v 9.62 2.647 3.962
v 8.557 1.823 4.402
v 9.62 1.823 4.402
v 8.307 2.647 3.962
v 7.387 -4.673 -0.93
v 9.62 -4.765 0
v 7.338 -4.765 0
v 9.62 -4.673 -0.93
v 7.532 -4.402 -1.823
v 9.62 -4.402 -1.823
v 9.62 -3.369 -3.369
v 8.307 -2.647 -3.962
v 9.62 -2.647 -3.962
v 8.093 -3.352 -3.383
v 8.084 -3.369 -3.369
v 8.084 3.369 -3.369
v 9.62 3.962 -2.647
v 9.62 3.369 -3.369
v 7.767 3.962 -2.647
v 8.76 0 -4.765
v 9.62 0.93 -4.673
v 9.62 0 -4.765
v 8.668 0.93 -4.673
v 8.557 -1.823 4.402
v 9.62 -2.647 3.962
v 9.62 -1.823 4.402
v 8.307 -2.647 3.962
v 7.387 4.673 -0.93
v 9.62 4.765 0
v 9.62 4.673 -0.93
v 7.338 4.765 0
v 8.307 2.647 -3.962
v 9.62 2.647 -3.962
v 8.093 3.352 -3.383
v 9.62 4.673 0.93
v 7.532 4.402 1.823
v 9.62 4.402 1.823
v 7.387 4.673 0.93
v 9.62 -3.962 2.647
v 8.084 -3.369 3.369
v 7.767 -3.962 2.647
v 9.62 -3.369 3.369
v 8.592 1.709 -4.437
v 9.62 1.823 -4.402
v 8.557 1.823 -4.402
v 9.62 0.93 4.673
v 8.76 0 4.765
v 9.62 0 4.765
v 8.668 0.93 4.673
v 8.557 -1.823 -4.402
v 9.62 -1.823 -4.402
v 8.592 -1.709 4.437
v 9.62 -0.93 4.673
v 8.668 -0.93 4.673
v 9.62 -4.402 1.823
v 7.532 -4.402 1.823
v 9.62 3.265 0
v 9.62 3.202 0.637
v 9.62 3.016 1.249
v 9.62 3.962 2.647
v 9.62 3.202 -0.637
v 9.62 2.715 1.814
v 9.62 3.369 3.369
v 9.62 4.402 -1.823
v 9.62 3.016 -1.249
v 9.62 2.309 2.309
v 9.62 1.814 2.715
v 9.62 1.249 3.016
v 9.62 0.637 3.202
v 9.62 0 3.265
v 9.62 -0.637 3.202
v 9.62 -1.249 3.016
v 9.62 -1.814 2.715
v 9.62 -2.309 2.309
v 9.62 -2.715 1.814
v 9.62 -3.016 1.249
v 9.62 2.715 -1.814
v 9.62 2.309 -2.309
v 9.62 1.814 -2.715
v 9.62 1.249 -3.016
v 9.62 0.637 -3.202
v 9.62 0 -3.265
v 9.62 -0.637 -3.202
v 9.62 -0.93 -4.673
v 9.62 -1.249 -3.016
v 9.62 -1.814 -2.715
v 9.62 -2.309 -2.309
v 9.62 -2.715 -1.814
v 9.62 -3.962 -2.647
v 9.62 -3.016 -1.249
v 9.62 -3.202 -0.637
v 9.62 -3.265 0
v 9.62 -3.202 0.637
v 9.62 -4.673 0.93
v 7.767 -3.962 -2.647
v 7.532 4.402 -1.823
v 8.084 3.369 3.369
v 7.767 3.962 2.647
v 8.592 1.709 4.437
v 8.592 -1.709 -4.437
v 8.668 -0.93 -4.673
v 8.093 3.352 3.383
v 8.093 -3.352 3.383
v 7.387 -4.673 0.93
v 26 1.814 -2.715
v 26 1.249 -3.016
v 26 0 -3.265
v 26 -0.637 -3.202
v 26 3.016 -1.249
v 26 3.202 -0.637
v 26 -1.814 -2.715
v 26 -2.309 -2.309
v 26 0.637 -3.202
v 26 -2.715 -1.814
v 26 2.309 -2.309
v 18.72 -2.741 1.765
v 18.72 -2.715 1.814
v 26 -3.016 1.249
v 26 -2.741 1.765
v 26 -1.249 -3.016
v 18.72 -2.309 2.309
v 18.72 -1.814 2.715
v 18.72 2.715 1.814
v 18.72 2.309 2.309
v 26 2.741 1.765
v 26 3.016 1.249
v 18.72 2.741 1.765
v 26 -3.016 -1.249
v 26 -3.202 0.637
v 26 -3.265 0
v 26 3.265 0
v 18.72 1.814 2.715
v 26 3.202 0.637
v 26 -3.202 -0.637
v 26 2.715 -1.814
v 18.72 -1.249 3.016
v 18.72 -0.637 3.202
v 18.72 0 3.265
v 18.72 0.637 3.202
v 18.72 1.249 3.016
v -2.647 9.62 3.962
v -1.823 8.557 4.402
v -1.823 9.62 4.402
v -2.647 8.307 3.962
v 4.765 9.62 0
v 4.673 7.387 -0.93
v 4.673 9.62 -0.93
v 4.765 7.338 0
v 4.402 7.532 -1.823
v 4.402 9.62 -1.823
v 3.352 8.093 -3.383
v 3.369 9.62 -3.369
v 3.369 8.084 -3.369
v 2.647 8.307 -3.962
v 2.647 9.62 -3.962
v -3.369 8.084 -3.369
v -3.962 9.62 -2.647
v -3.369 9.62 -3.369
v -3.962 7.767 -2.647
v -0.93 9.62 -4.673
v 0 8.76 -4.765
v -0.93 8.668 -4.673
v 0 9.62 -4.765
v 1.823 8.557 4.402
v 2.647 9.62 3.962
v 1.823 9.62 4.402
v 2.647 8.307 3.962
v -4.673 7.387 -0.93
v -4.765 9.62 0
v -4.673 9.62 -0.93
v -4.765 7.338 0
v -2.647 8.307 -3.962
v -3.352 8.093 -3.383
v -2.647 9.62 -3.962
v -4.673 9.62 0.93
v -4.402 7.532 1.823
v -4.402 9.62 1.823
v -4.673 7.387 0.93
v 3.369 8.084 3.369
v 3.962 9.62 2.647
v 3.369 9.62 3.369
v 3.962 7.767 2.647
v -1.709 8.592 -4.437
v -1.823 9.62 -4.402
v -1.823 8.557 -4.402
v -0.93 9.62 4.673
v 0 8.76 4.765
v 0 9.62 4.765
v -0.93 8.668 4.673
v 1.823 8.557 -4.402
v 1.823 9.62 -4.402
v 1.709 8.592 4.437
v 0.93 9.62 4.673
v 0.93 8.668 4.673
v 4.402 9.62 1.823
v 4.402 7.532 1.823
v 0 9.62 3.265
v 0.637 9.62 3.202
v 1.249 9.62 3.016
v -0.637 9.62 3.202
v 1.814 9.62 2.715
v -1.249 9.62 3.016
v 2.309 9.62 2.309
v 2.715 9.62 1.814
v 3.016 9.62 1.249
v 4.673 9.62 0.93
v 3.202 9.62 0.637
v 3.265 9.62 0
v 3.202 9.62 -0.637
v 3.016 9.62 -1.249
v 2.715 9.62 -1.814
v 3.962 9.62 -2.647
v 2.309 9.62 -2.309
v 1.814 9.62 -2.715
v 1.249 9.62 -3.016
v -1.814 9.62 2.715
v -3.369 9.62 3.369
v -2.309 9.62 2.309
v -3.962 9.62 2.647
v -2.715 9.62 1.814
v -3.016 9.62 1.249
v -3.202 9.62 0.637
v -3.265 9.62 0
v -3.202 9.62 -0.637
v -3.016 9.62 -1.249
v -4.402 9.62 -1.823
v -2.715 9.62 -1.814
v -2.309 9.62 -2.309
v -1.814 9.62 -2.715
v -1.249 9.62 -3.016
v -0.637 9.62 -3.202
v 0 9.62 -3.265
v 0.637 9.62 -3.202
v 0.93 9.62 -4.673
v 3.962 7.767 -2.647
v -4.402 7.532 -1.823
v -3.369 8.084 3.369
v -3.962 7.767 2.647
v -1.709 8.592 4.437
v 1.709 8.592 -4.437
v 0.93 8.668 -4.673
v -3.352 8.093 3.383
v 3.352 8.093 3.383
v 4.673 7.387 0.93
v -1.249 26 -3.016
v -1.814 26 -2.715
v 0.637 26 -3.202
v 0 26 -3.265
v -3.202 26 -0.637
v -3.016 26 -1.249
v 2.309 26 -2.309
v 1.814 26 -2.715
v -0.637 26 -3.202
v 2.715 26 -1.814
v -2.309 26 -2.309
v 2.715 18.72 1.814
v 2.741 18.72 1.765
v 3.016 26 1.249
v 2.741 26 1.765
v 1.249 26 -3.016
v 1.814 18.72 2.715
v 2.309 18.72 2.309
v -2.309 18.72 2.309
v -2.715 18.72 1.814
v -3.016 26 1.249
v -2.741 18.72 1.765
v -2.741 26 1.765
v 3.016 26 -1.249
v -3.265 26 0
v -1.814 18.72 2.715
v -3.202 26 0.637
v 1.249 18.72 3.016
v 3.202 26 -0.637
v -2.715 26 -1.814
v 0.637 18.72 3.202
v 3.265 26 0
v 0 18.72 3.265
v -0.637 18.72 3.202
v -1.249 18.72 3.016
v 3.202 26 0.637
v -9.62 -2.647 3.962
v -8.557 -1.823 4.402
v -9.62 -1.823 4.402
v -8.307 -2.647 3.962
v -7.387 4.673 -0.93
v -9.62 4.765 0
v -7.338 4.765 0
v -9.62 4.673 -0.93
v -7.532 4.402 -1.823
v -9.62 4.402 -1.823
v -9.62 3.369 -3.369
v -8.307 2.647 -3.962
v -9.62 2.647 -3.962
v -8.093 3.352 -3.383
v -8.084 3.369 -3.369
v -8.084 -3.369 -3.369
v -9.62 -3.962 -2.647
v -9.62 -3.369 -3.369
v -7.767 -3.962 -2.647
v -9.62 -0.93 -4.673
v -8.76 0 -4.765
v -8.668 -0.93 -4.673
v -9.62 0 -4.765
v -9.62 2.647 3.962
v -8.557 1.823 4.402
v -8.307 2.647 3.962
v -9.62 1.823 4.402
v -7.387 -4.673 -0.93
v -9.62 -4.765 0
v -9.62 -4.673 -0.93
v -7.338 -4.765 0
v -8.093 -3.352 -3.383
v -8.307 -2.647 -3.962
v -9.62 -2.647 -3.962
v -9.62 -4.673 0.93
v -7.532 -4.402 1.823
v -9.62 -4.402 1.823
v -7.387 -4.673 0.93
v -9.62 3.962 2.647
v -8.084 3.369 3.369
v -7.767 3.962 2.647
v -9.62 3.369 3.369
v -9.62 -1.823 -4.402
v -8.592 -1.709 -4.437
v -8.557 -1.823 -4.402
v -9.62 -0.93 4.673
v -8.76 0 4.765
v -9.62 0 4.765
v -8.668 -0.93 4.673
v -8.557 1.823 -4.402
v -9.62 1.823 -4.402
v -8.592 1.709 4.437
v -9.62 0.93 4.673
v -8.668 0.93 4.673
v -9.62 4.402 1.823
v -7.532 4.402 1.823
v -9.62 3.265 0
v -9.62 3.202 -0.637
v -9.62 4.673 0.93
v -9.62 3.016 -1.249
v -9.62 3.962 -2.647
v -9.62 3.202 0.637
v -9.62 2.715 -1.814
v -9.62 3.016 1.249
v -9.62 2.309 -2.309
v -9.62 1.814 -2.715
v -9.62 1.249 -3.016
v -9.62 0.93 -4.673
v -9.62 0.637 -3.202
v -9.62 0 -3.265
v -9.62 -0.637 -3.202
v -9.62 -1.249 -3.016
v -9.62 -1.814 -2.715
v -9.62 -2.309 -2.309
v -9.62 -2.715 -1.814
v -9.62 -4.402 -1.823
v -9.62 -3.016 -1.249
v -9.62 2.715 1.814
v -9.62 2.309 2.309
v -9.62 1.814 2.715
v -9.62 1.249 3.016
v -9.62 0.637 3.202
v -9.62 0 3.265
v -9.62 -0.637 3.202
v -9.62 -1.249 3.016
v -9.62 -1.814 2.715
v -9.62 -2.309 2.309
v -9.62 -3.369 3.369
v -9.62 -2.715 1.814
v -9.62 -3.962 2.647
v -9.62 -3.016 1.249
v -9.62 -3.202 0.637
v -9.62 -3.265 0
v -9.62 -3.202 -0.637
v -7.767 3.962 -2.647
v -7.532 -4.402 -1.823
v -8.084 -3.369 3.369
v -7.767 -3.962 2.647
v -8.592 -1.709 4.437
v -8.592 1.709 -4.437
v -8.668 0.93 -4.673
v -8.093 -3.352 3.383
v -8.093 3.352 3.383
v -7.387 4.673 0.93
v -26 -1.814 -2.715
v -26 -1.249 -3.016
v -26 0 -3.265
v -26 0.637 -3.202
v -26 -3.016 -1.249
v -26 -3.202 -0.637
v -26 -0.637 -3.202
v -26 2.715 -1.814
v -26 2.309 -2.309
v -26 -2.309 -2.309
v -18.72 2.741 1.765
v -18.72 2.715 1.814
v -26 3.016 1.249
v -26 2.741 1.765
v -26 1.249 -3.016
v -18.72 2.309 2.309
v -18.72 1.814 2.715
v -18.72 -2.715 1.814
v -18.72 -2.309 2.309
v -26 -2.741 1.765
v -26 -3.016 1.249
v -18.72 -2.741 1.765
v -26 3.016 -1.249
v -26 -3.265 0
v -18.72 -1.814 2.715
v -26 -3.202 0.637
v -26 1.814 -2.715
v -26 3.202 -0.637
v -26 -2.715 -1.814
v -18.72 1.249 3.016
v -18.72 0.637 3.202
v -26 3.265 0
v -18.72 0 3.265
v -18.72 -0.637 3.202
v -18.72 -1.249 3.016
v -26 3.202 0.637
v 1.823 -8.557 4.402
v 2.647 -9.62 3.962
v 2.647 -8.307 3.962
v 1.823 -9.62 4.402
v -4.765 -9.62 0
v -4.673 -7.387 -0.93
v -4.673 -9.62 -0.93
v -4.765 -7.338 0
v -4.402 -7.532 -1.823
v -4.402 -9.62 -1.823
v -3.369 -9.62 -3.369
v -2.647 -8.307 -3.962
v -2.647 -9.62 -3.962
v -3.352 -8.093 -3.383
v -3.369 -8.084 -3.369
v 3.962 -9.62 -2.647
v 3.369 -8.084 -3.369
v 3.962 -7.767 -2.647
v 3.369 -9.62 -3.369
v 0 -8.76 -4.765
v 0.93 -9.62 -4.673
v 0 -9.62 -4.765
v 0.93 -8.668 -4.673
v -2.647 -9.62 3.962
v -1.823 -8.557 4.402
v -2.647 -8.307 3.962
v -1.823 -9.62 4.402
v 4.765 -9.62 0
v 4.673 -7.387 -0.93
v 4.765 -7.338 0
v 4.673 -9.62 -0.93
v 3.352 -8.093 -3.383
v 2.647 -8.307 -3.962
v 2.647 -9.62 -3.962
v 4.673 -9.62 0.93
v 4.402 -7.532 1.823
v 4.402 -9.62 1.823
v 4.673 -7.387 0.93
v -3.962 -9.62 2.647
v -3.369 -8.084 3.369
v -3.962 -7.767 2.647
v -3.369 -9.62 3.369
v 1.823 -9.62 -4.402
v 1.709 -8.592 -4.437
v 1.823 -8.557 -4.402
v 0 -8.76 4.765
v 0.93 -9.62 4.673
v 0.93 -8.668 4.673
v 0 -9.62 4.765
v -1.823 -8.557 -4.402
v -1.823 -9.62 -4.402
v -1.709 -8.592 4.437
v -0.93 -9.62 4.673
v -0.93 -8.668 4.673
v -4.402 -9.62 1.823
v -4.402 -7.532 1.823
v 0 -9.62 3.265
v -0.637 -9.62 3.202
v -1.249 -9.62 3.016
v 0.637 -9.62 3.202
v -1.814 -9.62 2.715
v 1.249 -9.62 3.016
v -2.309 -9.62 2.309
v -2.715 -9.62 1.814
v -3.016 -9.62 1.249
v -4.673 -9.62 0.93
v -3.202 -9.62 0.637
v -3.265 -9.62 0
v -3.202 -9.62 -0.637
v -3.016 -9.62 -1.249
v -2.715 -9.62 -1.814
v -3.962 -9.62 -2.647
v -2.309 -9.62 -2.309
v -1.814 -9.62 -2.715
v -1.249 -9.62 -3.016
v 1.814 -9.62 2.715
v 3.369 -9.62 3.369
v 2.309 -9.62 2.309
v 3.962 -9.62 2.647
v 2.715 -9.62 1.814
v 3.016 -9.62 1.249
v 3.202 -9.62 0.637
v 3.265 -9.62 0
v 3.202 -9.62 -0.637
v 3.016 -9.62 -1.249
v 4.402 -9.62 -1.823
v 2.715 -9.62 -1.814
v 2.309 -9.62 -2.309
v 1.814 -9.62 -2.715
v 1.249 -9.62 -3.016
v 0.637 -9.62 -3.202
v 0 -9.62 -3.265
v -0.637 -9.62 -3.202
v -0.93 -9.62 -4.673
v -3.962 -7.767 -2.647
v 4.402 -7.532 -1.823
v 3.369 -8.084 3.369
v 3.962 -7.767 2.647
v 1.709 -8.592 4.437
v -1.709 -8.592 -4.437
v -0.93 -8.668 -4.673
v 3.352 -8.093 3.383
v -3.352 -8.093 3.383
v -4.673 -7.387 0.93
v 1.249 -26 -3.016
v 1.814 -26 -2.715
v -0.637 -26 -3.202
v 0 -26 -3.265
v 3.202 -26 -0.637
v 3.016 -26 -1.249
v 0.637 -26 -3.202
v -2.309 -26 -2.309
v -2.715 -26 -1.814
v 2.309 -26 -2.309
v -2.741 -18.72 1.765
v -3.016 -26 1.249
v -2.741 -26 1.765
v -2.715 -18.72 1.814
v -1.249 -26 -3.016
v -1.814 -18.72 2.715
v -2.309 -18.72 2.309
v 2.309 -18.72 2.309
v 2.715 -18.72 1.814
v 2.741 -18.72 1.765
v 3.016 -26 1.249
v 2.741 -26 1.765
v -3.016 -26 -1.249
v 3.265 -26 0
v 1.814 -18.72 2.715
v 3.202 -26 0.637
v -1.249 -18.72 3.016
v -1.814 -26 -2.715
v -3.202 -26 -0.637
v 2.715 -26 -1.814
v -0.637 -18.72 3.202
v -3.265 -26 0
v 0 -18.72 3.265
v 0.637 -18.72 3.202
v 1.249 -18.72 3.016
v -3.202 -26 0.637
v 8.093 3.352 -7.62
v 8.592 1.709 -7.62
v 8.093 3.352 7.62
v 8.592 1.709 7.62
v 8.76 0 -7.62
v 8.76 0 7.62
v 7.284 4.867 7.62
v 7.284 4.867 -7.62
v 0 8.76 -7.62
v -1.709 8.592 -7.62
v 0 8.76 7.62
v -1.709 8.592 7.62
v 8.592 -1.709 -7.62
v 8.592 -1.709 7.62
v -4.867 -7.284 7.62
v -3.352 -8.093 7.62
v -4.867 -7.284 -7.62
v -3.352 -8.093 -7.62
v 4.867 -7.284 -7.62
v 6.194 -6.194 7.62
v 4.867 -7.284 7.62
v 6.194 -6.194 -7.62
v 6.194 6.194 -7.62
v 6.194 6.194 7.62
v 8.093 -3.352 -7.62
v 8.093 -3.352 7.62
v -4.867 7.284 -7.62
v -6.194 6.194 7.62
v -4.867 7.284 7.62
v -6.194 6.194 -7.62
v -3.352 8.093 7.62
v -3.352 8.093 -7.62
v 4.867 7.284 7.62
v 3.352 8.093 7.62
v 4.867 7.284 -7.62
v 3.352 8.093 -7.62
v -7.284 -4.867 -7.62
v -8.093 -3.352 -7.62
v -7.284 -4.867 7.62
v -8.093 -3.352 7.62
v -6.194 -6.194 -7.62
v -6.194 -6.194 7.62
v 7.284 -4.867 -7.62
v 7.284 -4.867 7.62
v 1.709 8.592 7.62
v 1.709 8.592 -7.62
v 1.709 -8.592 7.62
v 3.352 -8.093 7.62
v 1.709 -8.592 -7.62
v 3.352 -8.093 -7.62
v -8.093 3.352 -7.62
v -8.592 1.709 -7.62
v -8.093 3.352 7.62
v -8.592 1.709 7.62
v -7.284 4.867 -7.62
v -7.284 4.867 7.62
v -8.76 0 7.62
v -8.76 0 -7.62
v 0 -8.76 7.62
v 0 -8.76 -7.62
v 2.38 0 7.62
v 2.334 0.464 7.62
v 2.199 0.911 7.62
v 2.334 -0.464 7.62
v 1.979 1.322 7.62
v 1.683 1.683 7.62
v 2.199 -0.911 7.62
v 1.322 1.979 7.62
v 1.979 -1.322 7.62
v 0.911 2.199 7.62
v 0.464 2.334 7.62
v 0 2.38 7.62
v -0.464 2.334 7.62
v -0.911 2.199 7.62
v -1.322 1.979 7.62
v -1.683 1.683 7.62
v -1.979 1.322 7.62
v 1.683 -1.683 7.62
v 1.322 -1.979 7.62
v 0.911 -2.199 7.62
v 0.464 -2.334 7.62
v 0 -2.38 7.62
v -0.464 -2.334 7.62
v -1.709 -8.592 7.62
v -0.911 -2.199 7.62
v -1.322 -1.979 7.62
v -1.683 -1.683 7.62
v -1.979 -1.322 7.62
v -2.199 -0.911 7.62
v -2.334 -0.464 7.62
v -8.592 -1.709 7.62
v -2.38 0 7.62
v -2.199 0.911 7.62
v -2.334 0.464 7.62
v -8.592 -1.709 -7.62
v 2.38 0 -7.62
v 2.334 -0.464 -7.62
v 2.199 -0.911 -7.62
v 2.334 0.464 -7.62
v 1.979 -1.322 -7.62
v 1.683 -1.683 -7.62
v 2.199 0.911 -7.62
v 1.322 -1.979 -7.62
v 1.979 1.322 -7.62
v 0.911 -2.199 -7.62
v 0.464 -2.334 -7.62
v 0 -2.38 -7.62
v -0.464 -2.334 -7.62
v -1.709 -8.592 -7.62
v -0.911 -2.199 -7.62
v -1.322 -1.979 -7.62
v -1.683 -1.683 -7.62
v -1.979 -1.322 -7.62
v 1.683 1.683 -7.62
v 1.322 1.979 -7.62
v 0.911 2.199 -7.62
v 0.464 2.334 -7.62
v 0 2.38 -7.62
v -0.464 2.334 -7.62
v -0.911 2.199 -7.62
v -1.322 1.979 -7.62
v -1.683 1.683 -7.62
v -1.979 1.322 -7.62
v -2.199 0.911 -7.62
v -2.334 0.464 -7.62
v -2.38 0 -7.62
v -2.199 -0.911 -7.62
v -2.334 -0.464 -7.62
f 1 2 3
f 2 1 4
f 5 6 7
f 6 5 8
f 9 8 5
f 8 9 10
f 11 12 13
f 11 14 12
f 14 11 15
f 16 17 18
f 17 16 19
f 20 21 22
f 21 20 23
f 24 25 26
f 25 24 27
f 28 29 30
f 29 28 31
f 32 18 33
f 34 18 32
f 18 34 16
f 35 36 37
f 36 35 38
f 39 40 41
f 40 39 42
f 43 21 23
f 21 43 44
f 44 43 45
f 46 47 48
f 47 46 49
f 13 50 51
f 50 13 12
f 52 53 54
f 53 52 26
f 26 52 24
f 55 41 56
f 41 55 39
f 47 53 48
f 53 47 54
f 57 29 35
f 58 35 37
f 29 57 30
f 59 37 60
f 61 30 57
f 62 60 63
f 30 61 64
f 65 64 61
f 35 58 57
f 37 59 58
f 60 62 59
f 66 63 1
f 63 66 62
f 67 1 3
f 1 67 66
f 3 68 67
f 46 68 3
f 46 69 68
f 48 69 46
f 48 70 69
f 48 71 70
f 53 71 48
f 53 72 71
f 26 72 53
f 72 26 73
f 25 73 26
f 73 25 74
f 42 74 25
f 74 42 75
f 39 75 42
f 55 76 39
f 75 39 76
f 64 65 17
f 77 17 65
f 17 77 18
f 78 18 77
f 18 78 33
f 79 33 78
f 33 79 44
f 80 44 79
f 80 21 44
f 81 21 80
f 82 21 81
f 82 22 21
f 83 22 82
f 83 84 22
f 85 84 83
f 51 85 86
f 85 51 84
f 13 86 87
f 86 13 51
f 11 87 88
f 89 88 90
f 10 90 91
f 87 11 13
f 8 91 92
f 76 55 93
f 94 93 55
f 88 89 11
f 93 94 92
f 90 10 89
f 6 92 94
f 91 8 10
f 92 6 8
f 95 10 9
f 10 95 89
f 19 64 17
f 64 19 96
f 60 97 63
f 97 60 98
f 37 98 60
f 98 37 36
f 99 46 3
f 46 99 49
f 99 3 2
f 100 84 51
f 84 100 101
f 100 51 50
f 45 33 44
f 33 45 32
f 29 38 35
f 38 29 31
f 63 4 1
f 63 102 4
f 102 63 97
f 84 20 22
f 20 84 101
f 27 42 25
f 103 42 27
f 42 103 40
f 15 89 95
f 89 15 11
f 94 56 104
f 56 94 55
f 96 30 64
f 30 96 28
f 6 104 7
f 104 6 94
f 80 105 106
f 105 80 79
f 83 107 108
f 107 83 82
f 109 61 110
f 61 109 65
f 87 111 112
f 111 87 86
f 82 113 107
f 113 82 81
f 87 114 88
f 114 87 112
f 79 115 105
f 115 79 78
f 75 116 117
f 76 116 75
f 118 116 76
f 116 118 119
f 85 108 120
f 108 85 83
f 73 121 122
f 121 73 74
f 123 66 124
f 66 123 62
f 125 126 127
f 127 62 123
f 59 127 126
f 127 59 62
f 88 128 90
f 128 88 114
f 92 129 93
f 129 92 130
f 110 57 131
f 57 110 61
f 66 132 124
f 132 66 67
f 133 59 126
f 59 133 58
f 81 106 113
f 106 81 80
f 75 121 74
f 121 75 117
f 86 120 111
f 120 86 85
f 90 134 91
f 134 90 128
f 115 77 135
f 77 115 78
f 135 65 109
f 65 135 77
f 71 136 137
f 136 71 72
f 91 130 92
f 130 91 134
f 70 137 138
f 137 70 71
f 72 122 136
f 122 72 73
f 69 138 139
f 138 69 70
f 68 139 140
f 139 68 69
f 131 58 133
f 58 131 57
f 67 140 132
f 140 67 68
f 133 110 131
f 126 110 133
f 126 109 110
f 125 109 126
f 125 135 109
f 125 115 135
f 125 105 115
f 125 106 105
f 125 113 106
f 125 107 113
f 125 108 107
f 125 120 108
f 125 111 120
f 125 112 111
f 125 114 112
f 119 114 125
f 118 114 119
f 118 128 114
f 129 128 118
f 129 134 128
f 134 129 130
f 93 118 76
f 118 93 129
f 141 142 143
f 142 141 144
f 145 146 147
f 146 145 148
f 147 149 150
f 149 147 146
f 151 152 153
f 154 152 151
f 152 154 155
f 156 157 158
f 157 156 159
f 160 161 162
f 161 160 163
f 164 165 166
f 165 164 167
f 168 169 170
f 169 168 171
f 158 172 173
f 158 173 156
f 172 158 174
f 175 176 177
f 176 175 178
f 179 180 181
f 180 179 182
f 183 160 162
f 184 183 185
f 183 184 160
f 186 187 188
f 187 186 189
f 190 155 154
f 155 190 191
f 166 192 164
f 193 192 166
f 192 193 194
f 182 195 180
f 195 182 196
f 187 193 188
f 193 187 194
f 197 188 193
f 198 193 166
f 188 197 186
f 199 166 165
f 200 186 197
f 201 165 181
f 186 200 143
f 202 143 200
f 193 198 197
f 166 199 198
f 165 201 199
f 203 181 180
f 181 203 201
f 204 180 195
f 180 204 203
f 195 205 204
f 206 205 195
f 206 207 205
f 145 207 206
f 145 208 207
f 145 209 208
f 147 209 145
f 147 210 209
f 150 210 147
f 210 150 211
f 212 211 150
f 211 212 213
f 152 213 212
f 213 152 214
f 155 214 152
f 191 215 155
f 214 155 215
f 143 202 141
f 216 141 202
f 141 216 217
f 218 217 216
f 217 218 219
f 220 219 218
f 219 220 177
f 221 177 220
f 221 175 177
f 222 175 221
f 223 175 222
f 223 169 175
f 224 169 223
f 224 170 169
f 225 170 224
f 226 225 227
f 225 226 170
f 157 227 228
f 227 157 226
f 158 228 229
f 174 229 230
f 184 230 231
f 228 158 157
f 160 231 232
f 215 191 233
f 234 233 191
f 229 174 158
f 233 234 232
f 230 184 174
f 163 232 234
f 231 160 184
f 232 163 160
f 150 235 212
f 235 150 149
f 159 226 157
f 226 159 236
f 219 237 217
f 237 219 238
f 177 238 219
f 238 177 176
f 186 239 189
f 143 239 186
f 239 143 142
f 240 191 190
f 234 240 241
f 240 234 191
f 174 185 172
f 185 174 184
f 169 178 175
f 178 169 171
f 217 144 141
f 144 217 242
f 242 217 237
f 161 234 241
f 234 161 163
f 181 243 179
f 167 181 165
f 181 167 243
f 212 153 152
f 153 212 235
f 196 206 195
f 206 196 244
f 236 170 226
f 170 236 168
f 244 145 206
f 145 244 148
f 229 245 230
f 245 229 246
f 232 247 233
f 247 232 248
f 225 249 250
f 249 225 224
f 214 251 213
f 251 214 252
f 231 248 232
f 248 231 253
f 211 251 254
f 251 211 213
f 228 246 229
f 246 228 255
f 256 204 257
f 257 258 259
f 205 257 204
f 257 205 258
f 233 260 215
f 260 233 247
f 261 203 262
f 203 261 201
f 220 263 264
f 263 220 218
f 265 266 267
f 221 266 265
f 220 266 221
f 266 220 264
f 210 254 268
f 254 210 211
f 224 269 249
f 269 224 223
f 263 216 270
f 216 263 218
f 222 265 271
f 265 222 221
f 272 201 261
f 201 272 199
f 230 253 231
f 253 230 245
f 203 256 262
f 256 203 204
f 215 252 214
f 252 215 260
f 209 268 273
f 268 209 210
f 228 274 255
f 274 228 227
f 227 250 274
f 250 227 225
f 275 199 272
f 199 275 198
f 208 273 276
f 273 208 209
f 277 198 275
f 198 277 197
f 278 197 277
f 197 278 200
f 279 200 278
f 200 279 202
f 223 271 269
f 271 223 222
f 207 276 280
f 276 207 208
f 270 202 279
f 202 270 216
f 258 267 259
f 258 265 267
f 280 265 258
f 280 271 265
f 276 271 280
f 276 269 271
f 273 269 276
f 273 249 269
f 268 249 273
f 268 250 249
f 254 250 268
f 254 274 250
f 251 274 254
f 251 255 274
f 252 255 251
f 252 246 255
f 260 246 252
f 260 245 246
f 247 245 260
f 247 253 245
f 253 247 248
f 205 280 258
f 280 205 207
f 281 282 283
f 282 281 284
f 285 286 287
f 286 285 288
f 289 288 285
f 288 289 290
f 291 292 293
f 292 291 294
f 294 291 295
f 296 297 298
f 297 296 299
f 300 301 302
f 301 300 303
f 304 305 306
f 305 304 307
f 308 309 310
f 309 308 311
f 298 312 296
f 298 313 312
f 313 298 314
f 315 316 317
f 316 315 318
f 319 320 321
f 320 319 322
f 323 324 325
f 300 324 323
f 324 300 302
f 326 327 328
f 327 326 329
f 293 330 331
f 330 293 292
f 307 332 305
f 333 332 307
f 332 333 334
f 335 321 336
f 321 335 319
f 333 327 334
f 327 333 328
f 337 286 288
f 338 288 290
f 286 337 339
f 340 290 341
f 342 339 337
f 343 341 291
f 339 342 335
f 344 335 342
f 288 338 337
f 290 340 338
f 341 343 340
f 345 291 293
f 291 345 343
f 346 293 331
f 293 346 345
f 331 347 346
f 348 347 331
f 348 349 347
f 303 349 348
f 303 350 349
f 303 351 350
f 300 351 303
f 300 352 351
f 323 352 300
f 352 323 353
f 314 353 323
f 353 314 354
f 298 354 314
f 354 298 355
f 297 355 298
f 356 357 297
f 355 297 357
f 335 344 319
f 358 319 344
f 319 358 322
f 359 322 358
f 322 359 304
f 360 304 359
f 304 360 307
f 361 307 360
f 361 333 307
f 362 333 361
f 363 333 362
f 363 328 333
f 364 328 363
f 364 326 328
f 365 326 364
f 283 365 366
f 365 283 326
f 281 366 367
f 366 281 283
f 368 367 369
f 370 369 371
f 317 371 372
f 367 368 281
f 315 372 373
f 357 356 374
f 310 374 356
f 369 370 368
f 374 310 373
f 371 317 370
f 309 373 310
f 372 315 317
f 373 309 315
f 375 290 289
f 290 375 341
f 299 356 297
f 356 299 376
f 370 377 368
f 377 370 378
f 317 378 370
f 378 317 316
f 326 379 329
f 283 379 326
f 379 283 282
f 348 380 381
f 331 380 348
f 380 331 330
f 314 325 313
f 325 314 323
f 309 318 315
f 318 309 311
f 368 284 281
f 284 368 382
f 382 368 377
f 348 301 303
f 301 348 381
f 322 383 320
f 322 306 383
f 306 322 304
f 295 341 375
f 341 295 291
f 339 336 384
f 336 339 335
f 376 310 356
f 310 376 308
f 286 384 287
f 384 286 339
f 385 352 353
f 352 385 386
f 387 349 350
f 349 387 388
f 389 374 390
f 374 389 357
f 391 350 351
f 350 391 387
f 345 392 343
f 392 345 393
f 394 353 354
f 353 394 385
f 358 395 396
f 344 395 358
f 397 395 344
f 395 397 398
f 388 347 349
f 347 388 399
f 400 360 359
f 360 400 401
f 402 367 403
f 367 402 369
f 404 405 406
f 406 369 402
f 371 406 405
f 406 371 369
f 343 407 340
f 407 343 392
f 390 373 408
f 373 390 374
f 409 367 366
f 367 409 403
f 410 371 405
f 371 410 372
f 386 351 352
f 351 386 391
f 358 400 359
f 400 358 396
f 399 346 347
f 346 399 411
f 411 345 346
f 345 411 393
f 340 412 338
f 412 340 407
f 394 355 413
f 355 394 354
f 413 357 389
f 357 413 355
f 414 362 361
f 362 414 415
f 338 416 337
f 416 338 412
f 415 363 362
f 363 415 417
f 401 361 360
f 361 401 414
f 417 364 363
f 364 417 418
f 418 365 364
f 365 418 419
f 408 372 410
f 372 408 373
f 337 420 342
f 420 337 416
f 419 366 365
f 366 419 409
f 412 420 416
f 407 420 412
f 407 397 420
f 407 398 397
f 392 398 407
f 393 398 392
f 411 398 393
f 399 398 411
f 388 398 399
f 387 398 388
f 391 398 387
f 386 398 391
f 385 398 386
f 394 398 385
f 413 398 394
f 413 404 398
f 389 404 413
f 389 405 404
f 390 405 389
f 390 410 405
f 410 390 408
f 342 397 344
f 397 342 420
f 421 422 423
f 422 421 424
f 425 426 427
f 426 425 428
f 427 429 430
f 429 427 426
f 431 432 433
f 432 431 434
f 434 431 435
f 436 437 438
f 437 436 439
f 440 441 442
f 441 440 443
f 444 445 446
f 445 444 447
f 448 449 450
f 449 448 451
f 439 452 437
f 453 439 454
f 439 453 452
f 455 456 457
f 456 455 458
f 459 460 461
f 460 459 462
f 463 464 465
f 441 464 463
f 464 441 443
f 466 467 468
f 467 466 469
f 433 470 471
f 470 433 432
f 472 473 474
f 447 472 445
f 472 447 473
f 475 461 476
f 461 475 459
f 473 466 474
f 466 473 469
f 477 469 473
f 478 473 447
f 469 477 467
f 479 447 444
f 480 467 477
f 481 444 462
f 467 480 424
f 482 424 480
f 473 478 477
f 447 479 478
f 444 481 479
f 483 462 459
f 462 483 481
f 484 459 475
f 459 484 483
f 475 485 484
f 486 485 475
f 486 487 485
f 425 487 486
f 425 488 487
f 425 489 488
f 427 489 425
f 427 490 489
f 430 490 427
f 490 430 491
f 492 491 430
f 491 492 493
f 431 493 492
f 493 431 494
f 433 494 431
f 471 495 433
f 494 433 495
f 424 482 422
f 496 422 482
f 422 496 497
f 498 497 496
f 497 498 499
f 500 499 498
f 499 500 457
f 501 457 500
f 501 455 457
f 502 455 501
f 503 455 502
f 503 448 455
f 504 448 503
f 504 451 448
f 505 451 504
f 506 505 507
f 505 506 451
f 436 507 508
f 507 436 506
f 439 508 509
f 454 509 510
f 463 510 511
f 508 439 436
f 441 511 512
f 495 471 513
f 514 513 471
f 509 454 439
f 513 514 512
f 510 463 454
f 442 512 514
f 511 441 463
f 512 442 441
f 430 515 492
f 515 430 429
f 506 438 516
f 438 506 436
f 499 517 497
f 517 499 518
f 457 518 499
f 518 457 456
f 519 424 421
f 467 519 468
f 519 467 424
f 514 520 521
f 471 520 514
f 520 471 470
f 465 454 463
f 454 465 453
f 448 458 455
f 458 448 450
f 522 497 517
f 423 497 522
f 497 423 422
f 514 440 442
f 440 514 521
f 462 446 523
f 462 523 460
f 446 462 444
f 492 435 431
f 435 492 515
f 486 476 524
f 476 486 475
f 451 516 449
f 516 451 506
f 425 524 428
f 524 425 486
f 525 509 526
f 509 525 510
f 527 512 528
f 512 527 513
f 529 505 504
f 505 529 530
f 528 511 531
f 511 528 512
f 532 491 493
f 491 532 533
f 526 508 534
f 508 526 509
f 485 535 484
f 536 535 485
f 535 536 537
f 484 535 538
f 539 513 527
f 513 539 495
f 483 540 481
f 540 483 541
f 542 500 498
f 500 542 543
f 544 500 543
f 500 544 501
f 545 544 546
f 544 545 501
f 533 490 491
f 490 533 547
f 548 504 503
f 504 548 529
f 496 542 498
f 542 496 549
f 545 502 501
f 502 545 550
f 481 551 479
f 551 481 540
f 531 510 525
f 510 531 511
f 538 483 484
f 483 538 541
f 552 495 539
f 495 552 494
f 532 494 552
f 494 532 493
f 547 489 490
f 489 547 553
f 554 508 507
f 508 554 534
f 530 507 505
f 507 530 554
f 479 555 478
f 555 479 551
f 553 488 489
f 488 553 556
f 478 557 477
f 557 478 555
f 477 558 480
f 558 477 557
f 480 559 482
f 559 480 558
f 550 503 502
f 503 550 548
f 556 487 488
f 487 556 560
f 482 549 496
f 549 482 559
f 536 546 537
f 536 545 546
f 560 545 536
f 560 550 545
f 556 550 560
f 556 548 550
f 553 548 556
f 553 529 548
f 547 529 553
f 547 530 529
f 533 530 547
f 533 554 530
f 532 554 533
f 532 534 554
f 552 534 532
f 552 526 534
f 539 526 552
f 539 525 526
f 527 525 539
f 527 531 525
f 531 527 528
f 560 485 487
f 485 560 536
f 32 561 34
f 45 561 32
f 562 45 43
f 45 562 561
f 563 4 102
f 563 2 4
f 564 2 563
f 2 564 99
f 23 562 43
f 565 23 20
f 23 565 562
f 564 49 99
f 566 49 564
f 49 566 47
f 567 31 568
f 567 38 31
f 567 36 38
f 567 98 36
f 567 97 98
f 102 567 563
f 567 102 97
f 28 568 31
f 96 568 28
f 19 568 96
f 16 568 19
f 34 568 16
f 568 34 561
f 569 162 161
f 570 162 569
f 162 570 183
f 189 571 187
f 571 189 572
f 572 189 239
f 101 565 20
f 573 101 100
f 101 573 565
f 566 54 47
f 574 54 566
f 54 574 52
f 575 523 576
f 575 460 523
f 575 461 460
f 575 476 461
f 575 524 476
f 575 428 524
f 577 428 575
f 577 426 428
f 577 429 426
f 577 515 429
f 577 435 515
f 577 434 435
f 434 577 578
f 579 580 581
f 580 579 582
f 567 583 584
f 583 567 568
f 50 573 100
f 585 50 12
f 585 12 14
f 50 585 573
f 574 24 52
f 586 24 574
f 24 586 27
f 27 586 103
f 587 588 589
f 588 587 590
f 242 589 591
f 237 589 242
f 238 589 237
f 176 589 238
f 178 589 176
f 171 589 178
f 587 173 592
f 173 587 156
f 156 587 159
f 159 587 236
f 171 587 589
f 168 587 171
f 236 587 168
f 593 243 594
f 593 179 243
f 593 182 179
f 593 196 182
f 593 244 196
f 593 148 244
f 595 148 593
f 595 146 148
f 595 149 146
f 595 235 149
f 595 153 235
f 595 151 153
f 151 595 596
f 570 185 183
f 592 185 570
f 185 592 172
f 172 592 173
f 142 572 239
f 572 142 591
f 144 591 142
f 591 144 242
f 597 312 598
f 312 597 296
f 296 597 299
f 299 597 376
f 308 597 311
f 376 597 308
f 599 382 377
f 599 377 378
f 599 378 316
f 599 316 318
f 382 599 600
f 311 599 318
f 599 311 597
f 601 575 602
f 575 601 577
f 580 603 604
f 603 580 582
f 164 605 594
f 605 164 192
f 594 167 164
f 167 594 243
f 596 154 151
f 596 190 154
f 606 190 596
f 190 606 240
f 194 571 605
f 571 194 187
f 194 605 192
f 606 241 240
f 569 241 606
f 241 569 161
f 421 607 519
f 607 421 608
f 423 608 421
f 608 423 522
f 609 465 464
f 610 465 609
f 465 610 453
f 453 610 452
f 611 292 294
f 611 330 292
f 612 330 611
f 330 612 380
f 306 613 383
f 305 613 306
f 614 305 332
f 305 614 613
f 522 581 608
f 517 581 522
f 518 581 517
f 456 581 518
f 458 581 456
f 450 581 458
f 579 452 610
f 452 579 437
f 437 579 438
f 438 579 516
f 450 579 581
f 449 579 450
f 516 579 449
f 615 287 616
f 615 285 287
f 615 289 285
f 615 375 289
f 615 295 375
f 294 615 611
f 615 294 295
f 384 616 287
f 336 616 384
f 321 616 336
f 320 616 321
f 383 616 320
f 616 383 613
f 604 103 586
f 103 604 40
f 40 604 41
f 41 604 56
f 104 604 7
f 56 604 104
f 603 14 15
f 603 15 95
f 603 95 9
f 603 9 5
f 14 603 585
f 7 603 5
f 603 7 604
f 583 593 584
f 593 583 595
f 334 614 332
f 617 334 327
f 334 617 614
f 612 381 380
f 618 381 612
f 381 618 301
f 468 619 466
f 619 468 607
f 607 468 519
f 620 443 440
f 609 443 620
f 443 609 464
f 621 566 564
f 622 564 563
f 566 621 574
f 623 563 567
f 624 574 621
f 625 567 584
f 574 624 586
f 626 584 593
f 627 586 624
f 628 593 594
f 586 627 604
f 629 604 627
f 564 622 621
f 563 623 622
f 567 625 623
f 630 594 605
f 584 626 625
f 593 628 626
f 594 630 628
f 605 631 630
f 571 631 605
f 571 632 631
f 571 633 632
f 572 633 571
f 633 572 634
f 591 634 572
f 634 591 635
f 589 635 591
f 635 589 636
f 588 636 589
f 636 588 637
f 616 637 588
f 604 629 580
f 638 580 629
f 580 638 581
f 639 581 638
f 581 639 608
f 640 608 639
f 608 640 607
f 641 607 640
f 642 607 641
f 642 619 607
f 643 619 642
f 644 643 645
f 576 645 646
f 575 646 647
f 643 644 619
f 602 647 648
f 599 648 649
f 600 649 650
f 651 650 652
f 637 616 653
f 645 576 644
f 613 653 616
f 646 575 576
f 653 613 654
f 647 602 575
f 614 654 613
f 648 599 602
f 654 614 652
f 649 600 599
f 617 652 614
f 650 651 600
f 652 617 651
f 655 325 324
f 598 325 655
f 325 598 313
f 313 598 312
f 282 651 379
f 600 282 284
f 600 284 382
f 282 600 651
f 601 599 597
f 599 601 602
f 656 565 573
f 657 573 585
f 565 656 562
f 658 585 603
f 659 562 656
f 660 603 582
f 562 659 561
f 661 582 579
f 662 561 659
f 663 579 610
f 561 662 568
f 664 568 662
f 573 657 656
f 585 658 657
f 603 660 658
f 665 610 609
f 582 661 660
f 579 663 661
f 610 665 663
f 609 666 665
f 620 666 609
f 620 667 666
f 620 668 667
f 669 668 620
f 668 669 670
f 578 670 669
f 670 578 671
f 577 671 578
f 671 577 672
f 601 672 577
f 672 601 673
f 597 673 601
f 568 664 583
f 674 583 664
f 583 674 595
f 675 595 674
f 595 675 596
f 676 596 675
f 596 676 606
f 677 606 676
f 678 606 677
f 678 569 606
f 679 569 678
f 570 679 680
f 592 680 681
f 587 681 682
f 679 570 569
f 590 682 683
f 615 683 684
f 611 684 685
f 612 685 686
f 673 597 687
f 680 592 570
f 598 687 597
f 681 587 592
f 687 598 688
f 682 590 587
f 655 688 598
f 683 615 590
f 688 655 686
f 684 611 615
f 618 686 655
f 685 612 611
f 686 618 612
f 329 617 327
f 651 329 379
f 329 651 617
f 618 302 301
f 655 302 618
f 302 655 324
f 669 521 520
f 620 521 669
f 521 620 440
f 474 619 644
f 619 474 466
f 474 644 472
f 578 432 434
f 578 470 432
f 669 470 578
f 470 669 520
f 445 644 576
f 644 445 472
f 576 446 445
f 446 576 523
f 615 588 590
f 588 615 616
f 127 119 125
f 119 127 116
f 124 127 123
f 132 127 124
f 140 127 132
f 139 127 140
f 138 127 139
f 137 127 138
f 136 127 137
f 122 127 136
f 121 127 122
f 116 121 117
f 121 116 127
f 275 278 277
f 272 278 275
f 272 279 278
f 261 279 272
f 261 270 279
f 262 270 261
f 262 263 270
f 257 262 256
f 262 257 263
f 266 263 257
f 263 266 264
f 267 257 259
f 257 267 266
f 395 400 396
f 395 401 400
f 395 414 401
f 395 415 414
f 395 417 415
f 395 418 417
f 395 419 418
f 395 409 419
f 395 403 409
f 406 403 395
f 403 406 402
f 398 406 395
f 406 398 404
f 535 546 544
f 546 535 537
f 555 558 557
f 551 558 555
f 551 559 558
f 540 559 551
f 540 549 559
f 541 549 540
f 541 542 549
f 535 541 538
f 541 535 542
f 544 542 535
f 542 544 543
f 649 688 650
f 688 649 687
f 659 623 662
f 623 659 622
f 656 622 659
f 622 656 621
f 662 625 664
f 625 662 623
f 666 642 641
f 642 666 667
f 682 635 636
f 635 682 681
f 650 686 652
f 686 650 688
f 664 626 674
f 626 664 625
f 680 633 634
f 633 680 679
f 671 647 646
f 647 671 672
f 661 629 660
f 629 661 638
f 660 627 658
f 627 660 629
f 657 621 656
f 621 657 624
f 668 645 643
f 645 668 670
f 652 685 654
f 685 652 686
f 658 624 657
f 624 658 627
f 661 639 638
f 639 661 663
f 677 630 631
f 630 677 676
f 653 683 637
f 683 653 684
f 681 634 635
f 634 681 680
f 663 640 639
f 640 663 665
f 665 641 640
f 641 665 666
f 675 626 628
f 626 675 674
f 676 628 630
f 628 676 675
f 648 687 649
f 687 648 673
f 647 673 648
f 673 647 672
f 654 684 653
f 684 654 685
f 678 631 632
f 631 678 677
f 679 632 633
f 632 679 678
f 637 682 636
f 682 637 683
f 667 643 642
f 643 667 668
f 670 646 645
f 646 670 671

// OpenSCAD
$fn = 32;

// ----------------------------------------------------------------------
// Cardan cross: 52 mm span, 9.53 mm trunnions
// ----------------------------------------------------------------------

// --- parameters (mm) ---
journal_d = 9.53;         // trunnion diameter
arm_len = 26;             // trunnion length from the centre
step_r = 3.24;            // step position from the centre
step_d = 6.53;            // journal diameter after the step
hub_d = 17.52;            // hub diameter
hub_h = 15.24;            // hub height
bore_d = 4.76;            // hub bore
flat_d = 1.5;             // depth of the journal flat
flat_len = 7.28;          // length of the journal flat

difference() {
  union() {
    /* hub along the joint axis */
    cylinder(h = hub_h, d = hub_d, center = true);
    for (a = [0 : 90 : 270]) rotate([0, 0, a]) {
      /* trunnion, sunk into the hub */
      translate([hub_d / 4, 0, 0]) rotate([0, 90, 0]) cylinder(h = step_r + 2, d = journal_d);
      /* stepped journal out to the tip */
      translate([step_r - 0.5, 0, 0]) rotate([0, 90, 0]) cylinder(h = arm_len + 0.5 - step_r, d = step_d);
    }
  }
  /* lubrication bore through the hub, 2.5 mm clear on both sides */
  translate([0, 0, -hub_h / 2 - 2.5]) cylinder(h = hub_h + 5, d = bore_d);
  /* machined flat on each journal tip */
  for (a = [0 : 90 : 270]) rotate([0, 0, a]) {
    translate([arm_len - flat_len, -step_d, step_d / 2 - flat_d]) cube([flat_len + 0.5, 2 * step_d, flat_d + 2.5]);
  }
}
